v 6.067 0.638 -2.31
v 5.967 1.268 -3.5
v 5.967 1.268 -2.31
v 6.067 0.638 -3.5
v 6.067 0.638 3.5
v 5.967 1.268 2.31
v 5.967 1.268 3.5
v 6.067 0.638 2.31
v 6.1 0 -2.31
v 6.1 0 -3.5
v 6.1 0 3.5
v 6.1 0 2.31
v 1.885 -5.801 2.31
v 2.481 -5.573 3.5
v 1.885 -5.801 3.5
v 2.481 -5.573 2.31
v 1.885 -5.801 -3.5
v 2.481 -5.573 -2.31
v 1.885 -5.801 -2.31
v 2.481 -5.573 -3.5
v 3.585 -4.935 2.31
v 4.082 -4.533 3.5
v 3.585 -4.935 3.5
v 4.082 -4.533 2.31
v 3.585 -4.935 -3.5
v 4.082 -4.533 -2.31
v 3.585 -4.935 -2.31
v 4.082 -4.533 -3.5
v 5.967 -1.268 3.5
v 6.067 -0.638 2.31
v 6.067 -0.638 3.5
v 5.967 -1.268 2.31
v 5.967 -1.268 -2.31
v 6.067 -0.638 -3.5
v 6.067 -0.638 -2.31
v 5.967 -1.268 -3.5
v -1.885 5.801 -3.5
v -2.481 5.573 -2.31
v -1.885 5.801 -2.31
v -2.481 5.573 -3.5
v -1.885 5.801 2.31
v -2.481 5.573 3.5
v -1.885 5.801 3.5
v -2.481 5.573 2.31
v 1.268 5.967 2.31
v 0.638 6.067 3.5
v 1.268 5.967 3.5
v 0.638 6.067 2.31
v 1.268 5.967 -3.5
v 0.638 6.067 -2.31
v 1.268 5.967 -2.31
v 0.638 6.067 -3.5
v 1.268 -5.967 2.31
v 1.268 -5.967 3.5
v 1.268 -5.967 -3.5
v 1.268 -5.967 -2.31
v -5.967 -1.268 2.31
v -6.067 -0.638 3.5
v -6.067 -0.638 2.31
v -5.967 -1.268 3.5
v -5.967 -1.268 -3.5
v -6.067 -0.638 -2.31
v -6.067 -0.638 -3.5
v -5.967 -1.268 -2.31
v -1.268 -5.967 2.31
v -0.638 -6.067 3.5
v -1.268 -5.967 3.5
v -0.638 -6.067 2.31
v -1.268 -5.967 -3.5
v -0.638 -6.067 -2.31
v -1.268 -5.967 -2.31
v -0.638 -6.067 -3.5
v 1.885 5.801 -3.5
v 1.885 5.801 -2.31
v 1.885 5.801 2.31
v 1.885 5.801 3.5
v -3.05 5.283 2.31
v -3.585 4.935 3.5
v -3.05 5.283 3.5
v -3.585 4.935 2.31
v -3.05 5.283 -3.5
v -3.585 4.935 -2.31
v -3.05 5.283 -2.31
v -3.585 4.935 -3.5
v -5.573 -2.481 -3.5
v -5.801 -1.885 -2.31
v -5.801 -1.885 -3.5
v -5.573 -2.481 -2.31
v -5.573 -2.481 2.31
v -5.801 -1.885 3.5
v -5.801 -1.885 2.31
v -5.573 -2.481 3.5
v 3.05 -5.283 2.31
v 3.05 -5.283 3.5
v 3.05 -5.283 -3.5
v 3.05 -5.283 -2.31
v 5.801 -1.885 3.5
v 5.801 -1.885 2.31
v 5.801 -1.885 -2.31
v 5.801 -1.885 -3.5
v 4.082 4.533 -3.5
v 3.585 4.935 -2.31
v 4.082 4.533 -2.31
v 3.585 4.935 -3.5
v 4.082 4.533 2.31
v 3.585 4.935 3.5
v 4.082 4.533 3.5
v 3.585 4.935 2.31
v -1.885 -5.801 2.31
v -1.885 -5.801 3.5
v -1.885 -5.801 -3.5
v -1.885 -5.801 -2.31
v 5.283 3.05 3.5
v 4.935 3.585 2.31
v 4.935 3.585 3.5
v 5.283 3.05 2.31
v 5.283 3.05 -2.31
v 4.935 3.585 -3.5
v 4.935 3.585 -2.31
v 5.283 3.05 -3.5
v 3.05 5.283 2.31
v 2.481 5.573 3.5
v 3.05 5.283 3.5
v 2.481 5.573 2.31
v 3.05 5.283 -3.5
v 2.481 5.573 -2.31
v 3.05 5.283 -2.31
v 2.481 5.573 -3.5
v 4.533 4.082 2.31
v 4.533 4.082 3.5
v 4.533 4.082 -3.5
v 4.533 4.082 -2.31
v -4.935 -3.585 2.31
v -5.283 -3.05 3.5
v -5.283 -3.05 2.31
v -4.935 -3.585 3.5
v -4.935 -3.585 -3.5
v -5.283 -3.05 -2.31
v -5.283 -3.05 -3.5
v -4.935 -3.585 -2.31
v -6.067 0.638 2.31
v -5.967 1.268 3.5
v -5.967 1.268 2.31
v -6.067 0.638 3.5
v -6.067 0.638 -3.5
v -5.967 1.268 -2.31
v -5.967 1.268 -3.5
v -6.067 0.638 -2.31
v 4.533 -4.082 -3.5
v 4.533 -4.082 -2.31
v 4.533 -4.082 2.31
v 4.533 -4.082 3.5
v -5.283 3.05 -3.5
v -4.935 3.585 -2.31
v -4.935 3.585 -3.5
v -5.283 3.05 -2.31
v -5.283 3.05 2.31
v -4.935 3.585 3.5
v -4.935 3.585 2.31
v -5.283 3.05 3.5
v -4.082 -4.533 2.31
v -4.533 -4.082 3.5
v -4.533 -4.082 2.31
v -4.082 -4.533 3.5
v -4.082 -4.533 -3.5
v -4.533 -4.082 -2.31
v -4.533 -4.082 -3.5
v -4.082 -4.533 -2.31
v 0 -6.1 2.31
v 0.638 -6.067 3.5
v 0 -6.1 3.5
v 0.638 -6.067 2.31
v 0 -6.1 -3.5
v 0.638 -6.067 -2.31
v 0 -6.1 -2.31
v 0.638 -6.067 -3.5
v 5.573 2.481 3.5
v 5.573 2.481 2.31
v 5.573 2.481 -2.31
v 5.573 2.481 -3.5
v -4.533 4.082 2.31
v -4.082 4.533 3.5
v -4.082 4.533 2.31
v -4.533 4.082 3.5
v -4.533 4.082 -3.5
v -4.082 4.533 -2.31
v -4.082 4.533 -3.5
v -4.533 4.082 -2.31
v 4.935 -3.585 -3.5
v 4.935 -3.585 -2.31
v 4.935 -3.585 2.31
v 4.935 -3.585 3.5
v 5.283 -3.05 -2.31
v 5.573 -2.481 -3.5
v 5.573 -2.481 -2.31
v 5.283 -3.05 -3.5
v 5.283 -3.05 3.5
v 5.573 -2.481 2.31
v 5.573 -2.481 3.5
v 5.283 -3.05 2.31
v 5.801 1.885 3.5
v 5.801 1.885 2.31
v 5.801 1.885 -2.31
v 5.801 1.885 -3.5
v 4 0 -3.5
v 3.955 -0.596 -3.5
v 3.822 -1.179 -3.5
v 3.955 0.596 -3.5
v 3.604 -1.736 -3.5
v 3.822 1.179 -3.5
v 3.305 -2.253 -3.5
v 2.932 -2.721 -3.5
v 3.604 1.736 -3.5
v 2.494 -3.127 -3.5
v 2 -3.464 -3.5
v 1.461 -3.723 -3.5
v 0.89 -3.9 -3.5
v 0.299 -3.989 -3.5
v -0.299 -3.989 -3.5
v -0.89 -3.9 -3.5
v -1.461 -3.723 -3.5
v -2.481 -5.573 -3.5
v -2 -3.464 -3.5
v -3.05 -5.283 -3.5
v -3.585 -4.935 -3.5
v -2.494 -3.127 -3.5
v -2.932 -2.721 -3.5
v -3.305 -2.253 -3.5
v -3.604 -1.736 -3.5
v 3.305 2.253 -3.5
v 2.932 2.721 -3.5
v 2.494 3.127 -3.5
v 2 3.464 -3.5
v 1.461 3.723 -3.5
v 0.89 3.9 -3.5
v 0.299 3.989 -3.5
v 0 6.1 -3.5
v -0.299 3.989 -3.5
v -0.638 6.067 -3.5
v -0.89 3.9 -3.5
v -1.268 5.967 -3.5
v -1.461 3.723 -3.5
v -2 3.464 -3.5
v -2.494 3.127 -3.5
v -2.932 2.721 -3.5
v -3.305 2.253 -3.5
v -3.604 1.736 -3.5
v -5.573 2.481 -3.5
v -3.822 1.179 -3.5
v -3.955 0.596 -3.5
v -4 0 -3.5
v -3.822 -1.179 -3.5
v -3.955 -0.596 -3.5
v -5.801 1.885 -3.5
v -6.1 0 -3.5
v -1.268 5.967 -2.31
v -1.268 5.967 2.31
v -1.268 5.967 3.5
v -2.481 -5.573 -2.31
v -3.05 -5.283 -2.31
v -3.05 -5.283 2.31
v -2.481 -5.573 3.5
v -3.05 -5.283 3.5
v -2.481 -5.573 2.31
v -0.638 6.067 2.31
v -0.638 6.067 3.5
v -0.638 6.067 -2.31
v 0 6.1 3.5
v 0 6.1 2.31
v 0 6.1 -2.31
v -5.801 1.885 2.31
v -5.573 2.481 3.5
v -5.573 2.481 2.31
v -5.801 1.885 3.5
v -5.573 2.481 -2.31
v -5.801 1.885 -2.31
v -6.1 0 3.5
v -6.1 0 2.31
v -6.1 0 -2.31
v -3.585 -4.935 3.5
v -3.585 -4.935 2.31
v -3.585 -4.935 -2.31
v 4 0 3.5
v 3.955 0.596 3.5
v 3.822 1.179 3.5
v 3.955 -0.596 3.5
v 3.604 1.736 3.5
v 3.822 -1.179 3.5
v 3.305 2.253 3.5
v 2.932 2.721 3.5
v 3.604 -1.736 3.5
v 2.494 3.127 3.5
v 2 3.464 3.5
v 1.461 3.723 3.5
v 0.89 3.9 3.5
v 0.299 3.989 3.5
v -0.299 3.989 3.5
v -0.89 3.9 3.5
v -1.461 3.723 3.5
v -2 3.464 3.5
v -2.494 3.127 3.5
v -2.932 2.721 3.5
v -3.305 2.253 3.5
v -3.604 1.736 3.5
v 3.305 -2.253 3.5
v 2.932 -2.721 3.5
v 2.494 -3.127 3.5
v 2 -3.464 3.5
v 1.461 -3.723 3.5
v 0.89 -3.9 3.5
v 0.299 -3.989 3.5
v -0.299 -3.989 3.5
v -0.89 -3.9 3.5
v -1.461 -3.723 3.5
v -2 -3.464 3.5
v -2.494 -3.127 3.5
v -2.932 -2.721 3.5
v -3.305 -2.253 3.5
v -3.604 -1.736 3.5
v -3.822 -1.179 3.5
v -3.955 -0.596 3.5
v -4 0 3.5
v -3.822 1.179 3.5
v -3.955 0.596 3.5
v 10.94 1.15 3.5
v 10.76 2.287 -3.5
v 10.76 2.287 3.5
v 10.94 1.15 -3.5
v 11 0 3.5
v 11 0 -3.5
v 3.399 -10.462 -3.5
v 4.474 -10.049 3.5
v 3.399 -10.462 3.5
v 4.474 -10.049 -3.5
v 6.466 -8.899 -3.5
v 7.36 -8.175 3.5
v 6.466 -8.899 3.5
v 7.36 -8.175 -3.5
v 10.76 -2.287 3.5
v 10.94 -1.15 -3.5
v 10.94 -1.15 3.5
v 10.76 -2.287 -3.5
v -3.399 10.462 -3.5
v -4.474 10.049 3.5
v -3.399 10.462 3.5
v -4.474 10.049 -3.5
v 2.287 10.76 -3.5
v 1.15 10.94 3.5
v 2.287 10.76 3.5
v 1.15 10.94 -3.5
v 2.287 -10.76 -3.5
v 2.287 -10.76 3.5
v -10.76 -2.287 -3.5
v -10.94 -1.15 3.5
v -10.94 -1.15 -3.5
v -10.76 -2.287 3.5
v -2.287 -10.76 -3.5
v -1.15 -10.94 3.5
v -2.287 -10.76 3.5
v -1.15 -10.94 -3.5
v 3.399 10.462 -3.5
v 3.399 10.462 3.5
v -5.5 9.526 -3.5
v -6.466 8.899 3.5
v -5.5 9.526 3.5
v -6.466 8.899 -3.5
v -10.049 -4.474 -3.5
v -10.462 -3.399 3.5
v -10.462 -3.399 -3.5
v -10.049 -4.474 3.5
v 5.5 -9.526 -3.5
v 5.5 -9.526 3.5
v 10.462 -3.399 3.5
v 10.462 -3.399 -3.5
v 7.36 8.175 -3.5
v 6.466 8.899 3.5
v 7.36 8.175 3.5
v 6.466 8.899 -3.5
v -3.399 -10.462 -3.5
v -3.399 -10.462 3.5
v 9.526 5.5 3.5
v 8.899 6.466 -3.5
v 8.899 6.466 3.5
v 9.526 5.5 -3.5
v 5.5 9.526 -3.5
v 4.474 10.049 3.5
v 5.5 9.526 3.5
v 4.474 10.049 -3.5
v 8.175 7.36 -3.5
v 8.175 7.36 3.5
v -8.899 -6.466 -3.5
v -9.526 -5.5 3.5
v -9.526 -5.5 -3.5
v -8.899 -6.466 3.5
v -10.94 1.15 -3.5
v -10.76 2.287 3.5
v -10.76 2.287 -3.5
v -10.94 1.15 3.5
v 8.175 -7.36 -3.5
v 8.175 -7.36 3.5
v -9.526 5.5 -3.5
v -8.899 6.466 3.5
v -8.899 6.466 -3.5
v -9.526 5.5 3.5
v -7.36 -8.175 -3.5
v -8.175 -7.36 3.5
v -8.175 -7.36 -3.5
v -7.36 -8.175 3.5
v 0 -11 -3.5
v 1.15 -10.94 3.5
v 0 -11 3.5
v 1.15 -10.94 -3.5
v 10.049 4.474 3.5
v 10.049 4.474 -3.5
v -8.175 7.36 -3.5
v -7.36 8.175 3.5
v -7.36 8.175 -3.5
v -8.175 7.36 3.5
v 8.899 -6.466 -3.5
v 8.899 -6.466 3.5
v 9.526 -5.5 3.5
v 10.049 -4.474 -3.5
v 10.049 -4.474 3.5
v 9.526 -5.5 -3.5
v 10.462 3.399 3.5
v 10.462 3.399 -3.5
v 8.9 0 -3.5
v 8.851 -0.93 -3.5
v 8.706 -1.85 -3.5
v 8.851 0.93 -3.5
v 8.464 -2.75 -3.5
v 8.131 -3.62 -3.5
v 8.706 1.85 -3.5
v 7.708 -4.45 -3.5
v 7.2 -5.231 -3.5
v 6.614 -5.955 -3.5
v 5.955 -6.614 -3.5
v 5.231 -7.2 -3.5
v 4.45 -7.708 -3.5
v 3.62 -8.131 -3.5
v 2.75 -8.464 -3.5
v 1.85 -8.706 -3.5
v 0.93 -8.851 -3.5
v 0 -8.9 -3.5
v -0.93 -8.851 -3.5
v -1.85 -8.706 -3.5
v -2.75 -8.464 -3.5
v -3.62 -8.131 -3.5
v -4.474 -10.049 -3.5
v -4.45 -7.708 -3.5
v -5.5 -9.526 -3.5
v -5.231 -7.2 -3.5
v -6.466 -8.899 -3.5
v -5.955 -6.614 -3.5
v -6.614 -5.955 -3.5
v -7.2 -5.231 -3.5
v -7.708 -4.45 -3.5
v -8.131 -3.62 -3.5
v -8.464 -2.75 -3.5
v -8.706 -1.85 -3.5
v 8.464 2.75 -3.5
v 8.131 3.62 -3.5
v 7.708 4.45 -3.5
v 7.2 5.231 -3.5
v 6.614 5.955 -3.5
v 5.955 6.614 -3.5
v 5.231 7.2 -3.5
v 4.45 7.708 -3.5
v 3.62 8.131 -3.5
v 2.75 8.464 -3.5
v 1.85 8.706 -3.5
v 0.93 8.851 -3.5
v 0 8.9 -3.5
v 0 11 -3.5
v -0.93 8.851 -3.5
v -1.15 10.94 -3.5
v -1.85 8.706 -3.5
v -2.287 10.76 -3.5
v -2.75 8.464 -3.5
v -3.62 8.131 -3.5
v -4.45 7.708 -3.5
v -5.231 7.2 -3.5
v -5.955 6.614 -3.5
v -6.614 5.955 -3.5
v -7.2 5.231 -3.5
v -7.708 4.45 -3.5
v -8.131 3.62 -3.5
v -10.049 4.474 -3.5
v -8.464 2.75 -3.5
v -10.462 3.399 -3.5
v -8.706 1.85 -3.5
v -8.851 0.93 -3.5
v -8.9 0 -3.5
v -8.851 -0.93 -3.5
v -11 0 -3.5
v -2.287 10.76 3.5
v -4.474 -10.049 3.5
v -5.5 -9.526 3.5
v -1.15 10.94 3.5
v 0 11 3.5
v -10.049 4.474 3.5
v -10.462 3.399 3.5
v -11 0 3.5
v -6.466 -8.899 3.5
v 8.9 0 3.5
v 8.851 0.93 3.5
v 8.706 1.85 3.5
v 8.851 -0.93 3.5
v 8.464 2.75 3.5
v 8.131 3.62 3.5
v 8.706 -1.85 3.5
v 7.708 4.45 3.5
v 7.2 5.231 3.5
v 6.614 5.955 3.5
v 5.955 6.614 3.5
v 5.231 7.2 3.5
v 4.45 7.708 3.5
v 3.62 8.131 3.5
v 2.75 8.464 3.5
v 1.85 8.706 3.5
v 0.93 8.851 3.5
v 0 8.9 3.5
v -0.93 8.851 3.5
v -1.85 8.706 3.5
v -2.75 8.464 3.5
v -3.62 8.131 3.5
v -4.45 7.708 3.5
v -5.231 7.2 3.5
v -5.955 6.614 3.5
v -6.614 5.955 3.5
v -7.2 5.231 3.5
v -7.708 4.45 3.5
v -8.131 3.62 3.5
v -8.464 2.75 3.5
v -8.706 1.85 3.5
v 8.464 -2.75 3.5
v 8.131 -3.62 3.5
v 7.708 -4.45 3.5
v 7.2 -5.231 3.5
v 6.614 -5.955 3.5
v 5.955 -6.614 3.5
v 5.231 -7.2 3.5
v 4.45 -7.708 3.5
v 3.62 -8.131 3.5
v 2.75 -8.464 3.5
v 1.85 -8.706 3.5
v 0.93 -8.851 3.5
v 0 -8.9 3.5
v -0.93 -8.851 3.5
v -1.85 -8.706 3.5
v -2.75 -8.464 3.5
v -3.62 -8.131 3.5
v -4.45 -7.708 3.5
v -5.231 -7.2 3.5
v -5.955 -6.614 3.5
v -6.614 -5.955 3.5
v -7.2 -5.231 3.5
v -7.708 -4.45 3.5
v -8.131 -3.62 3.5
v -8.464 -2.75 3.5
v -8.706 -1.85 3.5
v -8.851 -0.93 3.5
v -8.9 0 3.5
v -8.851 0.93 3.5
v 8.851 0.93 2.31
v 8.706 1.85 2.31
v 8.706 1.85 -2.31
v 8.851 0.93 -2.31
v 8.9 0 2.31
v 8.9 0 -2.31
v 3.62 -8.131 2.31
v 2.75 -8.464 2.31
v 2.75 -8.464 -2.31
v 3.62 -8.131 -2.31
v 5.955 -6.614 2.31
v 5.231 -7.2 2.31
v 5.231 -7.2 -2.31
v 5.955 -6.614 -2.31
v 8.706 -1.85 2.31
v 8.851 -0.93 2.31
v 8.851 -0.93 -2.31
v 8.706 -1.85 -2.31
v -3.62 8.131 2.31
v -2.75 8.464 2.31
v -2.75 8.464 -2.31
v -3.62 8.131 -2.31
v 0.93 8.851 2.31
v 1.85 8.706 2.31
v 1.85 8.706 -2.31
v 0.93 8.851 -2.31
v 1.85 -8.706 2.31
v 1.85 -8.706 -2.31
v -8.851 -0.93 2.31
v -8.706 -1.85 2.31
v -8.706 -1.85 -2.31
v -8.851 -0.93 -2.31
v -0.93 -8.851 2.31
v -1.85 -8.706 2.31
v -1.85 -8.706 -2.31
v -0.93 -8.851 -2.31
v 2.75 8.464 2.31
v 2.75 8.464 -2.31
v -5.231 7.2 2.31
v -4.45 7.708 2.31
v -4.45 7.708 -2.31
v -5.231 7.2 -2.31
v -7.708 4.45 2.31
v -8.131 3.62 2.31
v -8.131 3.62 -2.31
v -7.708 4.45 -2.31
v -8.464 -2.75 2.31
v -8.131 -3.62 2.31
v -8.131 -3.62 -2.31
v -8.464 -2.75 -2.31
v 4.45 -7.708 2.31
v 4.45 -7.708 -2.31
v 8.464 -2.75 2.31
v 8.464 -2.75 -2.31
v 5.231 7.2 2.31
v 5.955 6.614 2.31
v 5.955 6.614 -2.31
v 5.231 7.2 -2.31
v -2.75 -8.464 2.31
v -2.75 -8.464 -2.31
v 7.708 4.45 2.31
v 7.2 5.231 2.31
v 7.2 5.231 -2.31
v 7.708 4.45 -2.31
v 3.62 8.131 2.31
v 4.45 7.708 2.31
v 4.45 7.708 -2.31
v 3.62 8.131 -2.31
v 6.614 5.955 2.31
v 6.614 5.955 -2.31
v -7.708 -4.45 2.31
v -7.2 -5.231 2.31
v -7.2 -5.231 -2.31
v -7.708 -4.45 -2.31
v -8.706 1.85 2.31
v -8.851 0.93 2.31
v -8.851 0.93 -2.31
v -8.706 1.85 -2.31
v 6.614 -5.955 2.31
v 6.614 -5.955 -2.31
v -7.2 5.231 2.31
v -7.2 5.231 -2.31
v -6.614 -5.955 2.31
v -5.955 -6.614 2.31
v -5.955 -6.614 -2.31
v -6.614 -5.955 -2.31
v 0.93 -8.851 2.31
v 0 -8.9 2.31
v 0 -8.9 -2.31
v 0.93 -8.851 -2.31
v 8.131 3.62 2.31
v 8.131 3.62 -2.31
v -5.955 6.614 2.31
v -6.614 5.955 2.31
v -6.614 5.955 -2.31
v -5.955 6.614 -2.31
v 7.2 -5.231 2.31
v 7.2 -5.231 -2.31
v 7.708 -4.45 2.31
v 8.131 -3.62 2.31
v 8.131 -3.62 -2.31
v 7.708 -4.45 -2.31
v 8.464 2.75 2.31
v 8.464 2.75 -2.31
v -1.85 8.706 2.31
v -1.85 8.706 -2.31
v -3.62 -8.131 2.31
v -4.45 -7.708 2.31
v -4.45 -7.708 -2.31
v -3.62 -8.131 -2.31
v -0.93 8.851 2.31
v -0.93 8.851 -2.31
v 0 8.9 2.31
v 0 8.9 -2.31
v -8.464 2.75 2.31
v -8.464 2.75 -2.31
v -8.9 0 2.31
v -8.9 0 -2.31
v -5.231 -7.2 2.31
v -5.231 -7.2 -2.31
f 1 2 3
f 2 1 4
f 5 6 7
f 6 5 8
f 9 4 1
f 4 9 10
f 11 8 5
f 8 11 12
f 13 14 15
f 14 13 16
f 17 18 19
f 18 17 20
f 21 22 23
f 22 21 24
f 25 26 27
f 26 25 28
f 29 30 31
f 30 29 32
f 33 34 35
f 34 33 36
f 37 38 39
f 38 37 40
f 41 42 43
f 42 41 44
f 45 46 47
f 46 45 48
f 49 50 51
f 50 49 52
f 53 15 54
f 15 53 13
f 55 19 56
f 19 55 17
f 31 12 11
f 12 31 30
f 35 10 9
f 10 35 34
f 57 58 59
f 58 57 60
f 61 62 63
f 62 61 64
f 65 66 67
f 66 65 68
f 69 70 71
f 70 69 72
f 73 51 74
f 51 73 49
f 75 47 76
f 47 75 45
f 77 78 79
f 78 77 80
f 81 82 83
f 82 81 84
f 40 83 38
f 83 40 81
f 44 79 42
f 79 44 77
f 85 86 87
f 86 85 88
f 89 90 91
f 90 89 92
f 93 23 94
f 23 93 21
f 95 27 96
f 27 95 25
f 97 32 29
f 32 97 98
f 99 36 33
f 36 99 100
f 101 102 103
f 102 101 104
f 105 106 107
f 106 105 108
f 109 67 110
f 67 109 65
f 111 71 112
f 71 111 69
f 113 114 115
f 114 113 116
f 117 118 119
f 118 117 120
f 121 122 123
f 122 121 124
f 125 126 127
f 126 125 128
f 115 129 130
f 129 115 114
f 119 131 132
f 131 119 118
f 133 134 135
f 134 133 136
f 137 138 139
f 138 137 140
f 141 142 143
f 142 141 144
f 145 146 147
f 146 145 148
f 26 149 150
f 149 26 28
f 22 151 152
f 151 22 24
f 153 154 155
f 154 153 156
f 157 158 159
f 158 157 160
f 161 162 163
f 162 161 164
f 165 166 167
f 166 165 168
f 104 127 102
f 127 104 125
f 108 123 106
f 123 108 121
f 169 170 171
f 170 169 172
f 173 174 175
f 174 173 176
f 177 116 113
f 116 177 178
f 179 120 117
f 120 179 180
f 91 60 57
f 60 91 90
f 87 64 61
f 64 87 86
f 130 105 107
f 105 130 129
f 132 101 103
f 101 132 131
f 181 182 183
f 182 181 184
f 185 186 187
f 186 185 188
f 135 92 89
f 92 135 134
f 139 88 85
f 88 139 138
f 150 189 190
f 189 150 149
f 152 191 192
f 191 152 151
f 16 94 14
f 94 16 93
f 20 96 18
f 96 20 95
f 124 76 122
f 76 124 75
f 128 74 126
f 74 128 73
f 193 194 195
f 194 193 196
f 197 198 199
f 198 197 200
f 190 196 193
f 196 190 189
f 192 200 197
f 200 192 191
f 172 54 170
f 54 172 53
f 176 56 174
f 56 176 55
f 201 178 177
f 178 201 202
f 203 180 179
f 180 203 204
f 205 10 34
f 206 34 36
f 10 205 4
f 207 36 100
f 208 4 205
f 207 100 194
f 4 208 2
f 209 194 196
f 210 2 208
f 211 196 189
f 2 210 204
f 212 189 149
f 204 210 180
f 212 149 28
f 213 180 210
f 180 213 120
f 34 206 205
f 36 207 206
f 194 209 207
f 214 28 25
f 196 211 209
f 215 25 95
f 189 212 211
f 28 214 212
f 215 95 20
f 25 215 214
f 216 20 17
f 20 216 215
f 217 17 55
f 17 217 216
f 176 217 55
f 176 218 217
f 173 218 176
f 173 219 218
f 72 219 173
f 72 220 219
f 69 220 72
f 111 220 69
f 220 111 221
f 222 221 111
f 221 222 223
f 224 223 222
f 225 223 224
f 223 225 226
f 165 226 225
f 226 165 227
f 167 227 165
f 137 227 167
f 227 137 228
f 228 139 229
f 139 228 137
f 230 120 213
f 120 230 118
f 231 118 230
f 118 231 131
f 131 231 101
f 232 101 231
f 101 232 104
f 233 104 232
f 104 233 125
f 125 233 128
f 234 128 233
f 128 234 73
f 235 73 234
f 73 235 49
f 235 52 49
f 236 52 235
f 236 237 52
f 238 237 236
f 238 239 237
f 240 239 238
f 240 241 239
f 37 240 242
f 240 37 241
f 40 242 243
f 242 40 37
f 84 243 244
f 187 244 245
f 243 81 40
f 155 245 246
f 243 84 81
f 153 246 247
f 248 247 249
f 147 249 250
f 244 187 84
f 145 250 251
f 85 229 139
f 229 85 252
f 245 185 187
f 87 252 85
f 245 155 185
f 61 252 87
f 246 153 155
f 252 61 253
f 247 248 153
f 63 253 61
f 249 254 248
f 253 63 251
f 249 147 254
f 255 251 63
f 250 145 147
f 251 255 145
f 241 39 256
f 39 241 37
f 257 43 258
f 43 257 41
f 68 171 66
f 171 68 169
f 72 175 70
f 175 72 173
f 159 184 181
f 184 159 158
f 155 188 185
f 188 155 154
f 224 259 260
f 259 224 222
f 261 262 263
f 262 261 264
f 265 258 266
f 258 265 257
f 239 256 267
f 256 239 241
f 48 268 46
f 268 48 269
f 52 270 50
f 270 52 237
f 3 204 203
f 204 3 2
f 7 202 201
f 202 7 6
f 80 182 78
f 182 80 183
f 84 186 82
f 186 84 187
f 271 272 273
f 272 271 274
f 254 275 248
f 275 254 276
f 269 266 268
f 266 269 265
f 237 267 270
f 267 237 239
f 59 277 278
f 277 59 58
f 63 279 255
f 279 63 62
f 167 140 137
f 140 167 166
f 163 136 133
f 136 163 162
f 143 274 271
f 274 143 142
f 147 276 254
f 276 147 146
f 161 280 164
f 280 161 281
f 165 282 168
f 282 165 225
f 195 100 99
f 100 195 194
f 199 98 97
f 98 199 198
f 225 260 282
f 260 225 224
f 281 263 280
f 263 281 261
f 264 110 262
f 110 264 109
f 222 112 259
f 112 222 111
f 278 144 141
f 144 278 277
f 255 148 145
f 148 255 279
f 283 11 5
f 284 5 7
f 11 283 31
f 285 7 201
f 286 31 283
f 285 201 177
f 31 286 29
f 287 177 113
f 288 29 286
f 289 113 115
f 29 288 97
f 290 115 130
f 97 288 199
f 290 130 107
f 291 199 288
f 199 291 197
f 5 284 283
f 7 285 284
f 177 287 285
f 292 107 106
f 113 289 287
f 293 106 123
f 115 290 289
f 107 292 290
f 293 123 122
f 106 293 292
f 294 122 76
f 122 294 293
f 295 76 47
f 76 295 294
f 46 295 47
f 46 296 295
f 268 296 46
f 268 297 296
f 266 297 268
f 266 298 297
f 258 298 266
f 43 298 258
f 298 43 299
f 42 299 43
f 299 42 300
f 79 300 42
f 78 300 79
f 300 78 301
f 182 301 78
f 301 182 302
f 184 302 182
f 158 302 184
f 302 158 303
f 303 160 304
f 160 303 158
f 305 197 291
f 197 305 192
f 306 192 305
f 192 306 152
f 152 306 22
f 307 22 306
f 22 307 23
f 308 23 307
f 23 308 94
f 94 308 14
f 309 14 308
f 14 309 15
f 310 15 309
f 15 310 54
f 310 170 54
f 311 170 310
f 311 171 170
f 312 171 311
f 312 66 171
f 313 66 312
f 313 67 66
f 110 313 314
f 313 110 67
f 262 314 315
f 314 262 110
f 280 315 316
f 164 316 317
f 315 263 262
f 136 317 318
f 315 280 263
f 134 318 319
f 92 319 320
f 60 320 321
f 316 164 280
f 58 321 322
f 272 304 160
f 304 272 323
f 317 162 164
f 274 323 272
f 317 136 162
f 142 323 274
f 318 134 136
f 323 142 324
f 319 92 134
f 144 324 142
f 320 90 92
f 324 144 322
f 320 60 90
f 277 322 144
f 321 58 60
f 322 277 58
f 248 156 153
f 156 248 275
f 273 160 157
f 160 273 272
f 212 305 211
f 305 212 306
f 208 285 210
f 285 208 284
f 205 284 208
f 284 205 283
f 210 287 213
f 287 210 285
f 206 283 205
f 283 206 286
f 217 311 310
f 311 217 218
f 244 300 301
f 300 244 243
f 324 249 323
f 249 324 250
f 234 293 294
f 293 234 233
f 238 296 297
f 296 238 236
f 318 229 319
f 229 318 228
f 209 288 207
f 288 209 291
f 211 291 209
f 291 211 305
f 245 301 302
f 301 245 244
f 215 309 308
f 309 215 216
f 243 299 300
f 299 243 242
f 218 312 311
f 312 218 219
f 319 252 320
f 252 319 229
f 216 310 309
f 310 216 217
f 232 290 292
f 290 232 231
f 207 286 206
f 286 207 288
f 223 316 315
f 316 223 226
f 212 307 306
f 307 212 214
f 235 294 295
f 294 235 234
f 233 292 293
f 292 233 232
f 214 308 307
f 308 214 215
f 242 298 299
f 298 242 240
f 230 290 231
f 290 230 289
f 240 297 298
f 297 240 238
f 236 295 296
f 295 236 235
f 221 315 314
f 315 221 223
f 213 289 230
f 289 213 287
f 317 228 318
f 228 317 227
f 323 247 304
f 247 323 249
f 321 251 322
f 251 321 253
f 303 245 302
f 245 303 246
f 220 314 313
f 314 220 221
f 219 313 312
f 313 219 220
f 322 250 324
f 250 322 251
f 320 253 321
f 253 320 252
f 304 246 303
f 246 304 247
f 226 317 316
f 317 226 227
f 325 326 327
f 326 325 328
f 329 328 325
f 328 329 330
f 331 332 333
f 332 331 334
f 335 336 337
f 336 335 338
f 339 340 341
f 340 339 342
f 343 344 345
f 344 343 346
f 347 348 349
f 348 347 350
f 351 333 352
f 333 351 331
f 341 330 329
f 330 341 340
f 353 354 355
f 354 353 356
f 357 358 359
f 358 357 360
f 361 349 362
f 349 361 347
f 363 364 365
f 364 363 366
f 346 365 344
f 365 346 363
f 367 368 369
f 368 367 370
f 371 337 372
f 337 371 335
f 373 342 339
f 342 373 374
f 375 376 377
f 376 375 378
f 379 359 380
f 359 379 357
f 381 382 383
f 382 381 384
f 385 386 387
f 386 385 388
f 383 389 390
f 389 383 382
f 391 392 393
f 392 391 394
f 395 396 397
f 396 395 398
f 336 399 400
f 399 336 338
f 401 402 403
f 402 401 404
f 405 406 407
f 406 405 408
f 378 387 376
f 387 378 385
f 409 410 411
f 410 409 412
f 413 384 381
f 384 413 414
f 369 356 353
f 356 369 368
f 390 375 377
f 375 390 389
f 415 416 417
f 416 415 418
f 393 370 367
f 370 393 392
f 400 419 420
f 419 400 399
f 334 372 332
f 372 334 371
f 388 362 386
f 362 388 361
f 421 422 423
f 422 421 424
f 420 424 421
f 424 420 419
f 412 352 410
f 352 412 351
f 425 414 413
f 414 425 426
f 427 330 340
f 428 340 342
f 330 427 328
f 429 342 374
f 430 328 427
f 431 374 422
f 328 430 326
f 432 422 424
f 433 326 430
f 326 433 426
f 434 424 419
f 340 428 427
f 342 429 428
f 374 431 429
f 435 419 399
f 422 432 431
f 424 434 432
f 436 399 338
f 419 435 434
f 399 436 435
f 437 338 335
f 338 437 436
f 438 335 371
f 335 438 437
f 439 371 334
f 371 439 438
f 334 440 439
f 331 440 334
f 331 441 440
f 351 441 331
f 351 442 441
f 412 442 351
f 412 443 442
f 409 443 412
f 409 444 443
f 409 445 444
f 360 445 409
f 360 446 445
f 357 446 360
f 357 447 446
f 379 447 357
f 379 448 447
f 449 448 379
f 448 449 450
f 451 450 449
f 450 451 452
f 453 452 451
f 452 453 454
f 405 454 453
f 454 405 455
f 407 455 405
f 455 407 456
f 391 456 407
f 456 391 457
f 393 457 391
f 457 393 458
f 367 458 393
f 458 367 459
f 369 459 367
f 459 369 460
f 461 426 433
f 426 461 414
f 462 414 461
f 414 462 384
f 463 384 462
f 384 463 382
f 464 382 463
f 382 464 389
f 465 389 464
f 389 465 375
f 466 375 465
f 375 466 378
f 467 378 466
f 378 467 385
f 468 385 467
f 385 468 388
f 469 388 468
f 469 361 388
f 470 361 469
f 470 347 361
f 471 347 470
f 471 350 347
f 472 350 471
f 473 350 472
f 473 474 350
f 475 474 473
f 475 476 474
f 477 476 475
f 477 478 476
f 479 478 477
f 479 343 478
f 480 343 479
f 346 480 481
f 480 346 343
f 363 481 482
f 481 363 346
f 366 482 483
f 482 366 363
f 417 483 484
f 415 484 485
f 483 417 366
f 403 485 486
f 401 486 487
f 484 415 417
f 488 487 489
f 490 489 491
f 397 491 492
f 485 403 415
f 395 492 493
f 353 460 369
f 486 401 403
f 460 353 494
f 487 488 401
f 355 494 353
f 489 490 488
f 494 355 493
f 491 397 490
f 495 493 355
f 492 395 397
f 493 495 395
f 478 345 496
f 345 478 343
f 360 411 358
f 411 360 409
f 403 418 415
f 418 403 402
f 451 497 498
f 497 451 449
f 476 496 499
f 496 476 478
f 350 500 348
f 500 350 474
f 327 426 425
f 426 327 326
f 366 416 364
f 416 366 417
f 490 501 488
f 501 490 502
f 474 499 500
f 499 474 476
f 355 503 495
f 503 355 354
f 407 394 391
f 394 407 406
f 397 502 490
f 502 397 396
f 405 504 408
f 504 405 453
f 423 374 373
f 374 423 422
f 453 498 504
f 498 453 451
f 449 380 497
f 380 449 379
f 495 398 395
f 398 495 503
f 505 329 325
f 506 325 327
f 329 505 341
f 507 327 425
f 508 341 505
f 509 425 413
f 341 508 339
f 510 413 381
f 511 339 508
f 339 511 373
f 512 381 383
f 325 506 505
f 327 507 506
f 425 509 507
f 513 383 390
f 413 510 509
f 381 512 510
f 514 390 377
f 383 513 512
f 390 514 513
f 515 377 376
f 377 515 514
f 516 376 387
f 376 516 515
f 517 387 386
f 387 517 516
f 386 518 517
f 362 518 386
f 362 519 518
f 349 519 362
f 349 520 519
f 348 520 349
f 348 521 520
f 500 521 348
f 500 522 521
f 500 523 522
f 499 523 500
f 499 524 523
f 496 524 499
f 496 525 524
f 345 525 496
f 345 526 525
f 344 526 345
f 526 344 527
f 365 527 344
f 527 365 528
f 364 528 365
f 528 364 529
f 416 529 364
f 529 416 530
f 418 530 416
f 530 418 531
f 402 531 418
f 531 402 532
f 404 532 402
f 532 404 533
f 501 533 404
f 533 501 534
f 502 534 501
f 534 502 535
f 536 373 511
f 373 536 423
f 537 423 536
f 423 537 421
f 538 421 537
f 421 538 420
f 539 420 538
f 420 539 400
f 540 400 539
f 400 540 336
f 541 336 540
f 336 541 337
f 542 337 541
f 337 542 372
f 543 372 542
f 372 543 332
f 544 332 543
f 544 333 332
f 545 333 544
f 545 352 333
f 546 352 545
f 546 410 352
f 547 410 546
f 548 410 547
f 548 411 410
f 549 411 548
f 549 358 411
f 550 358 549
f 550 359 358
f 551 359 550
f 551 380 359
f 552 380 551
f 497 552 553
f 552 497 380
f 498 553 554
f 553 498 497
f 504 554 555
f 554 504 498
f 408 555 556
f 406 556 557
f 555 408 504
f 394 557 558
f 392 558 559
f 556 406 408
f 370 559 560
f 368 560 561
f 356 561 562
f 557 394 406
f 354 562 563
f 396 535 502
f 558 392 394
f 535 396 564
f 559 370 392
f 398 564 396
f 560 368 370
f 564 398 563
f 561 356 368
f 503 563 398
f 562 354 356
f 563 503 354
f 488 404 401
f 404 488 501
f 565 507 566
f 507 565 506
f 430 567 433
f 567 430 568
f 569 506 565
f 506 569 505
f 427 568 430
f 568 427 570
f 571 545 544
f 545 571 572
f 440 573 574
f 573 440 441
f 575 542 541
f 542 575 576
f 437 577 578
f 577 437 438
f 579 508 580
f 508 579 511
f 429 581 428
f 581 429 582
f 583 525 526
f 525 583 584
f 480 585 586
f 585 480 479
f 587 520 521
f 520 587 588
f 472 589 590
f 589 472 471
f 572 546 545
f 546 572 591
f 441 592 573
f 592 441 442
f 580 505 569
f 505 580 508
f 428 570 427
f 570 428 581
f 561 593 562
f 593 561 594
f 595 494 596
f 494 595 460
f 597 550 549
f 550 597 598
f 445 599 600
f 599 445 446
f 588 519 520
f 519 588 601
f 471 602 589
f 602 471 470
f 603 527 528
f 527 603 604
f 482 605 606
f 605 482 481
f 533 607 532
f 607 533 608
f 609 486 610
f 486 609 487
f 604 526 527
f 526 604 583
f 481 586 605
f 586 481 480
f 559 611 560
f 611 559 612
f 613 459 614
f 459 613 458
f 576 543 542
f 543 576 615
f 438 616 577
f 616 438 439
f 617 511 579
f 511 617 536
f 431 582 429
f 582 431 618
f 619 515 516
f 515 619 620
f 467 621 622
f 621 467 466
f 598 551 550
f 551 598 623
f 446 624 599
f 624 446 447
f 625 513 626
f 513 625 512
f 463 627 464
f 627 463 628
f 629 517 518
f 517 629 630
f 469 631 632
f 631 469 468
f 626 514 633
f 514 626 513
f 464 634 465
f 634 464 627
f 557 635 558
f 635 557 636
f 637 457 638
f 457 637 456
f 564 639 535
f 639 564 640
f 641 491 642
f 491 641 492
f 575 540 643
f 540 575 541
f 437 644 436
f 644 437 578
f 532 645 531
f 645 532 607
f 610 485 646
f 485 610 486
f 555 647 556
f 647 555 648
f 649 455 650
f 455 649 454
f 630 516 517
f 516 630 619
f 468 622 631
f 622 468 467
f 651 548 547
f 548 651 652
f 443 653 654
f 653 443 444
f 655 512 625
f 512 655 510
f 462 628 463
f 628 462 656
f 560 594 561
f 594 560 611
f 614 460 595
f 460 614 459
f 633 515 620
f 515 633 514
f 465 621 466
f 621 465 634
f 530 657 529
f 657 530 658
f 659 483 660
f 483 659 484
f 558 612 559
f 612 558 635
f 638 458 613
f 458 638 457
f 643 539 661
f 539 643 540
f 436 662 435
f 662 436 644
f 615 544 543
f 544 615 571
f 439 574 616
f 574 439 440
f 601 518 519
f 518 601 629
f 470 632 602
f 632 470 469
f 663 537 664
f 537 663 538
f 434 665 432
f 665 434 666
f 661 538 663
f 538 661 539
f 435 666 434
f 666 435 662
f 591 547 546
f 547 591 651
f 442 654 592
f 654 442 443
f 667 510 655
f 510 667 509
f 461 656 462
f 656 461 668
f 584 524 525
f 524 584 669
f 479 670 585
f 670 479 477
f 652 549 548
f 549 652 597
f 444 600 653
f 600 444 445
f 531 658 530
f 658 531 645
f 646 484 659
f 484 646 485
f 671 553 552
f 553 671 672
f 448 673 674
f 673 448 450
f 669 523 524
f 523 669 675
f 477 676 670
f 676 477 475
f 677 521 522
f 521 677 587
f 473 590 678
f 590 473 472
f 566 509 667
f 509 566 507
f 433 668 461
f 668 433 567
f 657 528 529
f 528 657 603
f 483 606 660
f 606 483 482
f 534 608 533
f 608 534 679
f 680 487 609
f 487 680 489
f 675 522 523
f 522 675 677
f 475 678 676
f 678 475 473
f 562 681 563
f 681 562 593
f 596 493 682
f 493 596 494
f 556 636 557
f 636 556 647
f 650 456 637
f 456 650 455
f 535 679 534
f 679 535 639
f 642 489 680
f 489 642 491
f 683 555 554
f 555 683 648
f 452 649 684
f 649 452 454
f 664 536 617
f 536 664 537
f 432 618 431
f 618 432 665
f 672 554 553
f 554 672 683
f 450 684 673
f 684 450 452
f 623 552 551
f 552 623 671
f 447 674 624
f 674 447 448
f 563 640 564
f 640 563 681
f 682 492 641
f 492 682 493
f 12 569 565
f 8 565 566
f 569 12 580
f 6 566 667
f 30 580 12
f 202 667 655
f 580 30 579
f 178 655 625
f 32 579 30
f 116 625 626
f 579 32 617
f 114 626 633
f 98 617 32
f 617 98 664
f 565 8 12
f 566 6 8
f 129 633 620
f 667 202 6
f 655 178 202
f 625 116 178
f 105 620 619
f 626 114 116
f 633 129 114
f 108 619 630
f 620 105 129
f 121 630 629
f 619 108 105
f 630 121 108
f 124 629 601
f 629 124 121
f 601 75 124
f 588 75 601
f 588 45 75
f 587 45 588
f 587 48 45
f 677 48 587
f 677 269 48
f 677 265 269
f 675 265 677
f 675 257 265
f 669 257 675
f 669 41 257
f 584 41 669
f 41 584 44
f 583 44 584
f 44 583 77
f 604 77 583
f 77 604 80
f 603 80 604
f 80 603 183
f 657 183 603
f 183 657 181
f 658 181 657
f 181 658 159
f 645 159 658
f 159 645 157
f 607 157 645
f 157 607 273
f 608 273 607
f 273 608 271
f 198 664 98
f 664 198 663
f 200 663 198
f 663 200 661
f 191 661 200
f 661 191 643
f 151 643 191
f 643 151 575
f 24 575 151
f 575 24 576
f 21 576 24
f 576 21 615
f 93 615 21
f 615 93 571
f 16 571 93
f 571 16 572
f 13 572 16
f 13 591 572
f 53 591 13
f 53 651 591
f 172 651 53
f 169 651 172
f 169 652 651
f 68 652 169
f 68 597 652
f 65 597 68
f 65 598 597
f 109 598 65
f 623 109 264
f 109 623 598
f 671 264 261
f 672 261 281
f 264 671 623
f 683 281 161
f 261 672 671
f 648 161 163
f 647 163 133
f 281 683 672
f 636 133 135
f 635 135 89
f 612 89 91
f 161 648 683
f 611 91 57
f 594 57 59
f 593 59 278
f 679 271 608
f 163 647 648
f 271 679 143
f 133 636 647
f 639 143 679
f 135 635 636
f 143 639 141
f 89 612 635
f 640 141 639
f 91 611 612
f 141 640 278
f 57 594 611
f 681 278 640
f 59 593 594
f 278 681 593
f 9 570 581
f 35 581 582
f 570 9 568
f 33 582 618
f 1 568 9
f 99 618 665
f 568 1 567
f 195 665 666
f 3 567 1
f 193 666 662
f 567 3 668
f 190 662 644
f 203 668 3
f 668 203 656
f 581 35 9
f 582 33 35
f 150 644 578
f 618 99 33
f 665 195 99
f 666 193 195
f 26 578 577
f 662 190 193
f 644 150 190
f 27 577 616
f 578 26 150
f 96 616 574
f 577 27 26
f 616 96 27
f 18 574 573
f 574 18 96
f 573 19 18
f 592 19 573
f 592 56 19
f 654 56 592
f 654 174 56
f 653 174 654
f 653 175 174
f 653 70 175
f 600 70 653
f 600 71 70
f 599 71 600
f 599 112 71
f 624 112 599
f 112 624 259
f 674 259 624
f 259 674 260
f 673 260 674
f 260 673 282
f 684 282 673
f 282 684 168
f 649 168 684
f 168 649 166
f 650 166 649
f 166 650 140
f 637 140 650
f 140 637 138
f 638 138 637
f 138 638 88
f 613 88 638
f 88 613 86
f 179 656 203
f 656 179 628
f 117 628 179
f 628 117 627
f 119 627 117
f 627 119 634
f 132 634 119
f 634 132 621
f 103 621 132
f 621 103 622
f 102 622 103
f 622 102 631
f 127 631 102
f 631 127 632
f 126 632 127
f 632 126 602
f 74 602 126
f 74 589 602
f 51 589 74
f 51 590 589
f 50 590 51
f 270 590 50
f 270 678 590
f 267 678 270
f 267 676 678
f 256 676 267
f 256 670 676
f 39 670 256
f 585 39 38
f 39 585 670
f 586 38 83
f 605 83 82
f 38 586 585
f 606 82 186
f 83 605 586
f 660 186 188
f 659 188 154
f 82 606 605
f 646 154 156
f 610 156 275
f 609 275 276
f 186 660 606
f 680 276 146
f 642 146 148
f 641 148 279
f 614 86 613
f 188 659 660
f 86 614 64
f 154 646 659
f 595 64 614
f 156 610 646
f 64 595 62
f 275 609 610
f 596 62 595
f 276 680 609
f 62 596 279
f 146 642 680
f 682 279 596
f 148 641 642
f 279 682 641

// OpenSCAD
use <common.scad>

// 용어:
// 1. 내경(bore)
// 2. 외경(outer diameter)
// 3. 폭(width)
// 4. 베어링(bearing)
//
// [내경(bore), 외경(outer diameter), 폭(width)] mm — 부품이 베어링(bearing) 치수를 참조할 때 쓰는 공개 값이다.
function bearing_608zz_spec() = [8, 22, 7];

module bearing_608zz(part_color = [0, 0.6, 1]) {
    bearing(bearing_spec = bearing_608zz_spec(), part_color = part_color);
}

bearing_608zz();
